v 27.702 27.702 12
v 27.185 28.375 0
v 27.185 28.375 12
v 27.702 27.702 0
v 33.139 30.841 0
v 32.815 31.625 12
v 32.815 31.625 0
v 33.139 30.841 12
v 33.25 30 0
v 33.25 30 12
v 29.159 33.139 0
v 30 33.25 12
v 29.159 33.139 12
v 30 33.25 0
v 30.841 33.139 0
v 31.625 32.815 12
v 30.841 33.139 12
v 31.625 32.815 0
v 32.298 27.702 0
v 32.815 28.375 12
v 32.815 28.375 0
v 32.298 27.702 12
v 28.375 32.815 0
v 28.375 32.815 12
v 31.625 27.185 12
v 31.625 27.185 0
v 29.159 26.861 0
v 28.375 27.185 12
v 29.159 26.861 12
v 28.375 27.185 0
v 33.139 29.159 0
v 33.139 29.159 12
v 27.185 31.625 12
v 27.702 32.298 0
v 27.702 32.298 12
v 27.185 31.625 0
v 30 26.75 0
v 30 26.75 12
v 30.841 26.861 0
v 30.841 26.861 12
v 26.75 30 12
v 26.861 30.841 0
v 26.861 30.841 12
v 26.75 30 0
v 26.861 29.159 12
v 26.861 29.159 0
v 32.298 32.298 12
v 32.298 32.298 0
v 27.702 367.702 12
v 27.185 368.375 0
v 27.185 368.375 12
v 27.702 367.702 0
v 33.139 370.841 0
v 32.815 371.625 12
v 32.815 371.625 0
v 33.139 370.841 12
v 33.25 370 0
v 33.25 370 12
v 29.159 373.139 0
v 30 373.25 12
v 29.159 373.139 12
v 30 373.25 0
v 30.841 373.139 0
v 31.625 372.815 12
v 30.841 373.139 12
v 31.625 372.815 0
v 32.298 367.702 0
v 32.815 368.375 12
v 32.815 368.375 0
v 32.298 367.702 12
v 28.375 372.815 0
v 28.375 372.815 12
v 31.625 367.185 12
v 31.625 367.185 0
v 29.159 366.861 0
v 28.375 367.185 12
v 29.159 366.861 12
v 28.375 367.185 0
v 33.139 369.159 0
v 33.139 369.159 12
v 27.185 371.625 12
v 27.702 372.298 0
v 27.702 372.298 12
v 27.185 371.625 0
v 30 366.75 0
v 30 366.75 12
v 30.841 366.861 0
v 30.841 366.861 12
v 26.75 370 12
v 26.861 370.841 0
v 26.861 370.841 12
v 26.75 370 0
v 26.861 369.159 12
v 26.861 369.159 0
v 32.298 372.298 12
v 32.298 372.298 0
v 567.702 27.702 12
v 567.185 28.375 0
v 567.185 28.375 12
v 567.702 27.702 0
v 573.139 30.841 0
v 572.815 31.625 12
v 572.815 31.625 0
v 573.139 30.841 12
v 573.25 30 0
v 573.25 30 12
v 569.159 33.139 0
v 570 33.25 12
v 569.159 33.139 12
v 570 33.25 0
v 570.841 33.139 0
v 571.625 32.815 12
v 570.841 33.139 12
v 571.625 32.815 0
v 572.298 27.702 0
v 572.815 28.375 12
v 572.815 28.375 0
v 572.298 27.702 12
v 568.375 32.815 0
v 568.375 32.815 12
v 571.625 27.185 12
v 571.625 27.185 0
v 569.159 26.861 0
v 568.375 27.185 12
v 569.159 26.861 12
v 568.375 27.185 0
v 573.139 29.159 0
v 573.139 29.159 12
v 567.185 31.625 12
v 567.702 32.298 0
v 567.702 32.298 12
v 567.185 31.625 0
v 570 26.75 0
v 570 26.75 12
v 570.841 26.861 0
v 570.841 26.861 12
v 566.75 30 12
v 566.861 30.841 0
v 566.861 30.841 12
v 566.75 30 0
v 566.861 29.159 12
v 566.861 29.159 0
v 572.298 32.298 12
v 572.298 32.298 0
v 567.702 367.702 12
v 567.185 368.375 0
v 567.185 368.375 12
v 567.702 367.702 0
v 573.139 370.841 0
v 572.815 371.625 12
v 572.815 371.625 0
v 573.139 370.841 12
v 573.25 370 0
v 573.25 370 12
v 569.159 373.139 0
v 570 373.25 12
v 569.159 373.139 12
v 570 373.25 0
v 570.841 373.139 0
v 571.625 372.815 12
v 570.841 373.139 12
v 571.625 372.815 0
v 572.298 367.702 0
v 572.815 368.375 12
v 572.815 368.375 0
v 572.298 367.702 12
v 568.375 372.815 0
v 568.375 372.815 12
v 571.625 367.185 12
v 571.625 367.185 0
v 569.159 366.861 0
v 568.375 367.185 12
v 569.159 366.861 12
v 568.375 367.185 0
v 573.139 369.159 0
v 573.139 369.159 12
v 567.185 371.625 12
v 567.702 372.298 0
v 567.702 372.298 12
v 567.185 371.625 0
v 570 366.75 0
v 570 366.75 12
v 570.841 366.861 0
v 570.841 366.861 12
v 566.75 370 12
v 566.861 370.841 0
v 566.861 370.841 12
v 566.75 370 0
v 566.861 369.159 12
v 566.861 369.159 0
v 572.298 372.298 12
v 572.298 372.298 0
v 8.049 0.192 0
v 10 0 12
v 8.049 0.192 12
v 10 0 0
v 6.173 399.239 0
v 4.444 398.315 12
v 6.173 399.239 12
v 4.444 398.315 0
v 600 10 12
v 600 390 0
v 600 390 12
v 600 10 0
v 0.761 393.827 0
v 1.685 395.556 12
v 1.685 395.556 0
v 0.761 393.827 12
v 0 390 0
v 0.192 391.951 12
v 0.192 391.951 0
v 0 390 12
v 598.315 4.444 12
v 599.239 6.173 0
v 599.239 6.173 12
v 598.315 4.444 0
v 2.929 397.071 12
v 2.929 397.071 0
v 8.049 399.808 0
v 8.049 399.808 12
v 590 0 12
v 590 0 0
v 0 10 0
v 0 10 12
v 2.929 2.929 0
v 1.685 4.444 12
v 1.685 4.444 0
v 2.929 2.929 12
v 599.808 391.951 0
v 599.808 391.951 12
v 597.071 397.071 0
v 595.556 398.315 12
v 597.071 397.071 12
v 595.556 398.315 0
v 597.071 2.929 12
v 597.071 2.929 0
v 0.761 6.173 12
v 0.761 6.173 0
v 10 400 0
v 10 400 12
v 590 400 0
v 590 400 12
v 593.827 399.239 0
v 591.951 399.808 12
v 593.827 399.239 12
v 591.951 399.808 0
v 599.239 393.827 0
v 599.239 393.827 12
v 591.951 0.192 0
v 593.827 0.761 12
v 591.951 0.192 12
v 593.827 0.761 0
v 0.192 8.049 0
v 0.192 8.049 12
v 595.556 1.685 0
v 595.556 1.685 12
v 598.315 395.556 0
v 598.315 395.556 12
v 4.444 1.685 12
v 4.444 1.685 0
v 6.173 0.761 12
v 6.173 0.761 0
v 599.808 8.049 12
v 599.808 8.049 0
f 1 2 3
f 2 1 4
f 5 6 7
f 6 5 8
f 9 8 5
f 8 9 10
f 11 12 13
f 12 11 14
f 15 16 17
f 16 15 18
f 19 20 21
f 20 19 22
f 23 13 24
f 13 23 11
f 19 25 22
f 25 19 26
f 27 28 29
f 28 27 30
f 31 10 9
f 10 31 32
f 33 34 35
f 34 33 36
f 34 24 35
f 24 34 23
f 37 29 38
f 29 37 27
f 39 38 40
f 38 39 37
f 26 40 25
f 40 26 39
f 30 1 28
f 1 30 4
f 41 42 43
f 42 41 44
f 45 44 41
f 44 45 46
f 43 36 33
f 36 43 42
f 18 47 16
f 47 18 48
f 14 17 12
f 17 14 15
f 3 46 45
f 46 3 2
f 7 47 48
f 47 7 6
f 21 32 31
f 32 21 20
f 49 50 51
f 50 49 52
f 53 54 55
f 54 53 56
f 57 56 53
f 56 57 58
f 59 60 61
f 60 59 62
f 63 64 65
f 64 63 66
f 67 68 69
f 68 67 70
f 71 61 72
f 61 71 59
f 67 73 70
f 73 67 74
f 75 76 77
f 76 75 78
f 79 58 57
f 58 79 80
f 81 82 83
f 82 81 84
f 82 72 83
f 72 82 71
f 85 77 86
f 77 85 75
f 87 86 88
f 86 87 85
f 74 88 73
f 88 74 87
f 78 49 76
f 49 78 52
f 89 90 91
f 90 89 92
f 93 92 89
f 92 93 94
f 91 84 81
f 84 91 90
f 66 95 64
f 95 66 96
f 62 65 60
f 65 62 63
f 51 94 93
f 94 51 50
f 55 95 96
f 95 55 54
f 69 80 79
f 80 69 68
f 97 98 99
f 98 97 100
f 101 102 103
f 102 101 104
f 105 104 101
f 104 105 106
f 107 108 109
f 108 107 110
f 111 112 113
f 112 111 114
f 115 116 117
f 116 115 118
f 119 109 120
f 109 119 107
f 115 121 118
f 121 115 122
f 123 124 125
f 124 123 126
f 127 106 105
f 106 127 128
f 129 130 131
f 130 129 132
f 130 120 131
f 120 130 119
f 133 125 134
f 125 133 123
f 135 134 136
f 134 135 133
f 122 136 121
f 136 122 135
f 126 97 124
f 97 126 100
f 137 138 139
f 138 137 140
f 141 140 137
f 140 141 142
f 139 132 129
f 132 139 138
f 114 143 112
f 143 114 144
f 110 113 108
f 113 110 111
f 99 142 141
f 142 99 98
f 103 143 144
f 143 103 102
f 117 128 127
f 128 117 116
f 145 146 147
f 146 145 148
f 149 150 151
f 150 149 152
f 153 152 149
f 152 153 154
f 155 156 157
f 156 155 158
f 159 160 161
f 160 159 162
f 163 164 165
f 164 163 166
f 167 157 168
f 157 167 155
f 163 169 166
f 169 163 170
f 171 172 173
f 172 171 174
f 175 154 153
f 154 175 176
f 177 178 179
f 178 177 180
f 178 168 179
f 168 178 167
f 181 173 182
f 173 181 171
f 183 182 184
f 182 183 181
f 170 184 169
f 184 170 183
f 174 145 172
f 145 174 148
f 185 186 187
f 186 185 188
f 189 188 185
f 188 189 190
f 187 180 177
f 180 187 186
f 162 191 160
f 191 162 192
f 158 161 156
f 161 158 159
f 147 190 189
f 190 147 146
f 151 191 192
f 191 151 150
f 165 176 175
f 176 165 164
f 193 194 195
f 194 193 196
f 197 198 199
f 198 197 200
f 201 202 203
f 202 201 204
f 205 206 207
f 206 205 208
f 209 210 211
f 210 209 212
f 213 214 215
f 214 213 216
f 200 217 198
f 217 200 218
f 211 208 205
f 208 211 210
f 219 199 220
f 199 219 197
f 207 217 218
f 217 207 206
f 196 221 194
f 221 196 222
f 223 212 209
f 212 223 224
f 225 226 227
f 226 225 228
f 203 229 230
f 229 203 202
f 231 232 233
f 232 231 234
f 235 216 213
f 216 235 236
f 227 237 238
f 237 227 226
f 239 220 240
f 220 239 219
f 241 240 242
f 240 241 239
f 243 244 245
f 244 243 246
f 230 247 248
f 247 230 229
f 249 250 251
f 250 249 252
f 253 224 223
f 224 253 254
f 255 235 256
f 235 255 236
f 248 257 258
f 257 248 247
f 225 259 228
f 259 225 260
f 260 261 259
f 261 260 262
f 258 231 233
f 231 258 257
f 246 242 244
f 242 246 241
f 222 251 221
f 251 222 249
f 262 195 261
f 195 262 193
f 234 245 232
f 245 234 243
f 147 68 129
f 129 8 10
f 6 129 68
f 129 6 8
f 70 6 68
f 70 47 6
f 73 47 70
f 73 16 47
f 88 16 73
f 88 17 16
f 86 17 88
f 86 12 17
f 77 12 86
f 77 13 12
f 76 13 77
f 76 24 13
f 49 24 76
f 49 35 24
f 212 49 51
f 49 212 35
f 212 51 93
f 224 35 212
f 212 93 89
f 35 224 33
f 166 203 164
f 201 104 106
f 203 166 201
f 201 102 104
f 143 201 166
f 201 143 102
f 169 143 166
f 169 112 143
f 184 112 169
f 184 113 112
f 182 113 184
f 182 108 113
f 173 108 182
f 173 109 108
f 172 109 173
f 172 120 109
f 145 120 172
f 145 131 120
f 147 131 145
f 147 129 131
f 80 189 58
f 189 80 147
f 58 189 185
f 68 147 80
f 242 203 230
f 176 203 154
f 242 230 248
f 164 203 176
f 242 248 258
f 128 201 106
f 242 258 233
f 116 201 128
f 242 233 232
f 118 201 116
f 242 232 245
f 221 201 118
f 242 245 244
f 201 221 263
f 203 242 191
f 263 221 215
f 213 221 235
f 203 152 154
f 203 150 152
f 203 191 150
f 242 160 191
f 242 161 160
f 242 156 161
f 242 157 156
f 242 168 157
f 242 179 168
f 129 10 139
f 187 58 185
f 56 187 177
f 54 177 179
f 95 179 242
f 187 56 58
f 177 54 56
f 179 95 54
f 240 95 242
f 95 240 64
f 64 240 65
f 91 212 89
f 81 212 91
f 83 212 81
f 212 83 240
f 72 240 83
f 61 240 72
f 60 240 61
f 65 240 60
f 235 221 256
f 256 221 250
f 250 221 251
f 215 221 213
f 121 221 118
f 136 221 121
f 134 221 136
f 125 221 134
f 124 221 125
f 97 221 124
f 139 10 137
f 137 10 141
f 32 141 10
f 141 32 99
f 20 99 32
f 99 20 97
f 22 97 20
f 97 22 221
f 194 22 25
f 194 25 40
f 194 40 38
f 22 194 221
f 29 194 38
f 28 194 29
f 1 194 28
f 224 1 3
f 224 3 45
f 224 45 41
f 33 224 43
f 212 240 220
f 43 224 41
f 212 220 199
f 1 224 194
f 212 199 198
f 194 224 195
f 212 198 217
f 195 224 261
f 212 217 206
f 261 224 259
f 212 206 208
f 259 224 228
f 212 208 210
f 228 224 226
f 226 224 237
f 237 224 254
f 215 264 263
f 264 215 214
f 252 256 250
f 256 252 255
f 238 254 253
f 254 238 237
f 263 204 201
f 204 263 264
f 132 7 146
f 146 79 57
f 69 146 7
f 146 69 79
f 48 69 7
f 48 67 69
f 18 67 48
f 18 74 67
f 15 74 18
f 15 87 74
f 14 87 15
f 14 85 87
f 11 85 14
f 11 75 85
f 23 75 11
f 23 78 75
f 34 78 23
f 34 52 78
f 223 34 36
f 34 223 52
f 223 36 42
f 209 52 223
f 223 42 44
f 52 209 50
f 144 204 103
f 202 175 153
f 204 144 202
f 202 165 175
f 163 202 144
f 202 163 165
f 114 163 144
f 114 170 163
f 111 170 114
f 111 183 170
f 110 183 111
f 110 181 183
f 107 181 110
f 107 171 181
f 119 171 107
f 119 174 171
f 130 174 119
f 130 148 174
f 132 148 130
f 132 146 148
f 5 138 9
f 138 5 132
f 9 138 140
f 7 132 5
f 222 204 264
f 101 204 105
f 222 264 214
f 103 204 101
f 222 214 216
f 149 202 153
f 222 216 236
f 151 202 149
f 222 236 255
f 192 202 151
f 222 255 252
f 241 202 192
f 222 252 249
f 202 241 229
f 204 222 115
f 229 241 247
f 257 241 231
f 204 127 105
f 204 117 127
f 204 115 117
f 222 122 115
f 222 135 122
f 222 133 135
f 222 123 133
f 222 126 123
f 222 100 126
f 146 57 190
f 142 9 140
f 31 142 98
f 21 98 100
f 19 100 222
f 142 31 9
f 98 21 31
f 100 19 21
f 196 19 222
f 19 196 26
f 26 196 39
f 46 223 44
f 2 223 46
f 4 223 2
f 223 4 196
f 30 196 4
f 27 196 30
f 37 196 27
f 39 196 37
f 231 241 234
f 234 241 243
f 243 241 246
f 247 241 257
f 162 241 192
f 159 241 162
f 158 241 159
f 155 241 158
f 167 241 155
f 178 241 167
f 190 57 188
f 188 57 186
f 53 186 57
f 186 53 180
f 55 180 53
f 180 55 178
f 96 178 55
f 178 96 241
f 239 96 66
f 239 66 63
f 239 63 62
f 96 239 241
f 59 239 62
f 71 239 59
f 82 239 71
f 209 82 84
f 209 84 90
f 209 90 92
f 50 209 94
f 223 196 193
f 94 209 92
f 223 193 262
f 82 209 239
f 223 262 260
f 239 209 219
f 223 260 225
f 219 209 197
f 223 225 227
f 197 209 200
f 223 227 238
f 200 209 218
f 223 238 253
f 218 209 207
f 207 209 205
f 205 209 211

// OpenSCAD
// AquaKeeper — Blocking Paddle (OpenSCAD)
// Parametric 3D model for the HDPE blocking paddle.
//
// Units: millimeters

// =============================================================
// Parameters
// =============================================================

paddle_width     = 600;    // mm
paddle_height    = 400;    // mm
paddle_thickness = 12;     // mm
chamfer_radius   = 10;     // mm (edge chamfer)

// Mounting holes
mount_hole_d     = 6.5;    // mm (M6 clearance)
mount_inset      = 30;     // mm from edge

// Color
paddle_color     = "OrangeRed";  // Signal orange

// =============================================================
// Modules
// =============================================================

module rounded_rect(w, h, t, r) {
    // A rectangular solid with rounded vertical edges
    hull() {
        for (x = [r, w - r]) {
            for (y = [r, h - r]) {
                translate([x, y, 0])
                cylinder(h=t, r=r, $fn=32);
            }
        }
    }
}

module paddle() {
    color(paddle_color)
    difference() {
        // Main body with chamfered edges
        rounded_rect(paddle_width, paddle_height, paddle_thickness, chamfer_radius);

        // Mounting holes
        for (dx = [mount_inset, paddle_width - mount_inset]) {
            for (dy = [mount_inset, paddle_height - mount_inset]) {
                translate([dx, dy, -1])
                cylinder(h=paddle_thickness + 2, d=mount_hole_d, $fn=24);
            }
        }
    }
}

// =============================================================
// Render
// =============================================================

paddle();

echo("Paddle rendered.");
echo(str("Width: ", paddle_width, " mm"));
echo(str("Height: ", paddle_height, " mm"));
echo(str("Thickness: ", paddle_thickness, " mm"));
